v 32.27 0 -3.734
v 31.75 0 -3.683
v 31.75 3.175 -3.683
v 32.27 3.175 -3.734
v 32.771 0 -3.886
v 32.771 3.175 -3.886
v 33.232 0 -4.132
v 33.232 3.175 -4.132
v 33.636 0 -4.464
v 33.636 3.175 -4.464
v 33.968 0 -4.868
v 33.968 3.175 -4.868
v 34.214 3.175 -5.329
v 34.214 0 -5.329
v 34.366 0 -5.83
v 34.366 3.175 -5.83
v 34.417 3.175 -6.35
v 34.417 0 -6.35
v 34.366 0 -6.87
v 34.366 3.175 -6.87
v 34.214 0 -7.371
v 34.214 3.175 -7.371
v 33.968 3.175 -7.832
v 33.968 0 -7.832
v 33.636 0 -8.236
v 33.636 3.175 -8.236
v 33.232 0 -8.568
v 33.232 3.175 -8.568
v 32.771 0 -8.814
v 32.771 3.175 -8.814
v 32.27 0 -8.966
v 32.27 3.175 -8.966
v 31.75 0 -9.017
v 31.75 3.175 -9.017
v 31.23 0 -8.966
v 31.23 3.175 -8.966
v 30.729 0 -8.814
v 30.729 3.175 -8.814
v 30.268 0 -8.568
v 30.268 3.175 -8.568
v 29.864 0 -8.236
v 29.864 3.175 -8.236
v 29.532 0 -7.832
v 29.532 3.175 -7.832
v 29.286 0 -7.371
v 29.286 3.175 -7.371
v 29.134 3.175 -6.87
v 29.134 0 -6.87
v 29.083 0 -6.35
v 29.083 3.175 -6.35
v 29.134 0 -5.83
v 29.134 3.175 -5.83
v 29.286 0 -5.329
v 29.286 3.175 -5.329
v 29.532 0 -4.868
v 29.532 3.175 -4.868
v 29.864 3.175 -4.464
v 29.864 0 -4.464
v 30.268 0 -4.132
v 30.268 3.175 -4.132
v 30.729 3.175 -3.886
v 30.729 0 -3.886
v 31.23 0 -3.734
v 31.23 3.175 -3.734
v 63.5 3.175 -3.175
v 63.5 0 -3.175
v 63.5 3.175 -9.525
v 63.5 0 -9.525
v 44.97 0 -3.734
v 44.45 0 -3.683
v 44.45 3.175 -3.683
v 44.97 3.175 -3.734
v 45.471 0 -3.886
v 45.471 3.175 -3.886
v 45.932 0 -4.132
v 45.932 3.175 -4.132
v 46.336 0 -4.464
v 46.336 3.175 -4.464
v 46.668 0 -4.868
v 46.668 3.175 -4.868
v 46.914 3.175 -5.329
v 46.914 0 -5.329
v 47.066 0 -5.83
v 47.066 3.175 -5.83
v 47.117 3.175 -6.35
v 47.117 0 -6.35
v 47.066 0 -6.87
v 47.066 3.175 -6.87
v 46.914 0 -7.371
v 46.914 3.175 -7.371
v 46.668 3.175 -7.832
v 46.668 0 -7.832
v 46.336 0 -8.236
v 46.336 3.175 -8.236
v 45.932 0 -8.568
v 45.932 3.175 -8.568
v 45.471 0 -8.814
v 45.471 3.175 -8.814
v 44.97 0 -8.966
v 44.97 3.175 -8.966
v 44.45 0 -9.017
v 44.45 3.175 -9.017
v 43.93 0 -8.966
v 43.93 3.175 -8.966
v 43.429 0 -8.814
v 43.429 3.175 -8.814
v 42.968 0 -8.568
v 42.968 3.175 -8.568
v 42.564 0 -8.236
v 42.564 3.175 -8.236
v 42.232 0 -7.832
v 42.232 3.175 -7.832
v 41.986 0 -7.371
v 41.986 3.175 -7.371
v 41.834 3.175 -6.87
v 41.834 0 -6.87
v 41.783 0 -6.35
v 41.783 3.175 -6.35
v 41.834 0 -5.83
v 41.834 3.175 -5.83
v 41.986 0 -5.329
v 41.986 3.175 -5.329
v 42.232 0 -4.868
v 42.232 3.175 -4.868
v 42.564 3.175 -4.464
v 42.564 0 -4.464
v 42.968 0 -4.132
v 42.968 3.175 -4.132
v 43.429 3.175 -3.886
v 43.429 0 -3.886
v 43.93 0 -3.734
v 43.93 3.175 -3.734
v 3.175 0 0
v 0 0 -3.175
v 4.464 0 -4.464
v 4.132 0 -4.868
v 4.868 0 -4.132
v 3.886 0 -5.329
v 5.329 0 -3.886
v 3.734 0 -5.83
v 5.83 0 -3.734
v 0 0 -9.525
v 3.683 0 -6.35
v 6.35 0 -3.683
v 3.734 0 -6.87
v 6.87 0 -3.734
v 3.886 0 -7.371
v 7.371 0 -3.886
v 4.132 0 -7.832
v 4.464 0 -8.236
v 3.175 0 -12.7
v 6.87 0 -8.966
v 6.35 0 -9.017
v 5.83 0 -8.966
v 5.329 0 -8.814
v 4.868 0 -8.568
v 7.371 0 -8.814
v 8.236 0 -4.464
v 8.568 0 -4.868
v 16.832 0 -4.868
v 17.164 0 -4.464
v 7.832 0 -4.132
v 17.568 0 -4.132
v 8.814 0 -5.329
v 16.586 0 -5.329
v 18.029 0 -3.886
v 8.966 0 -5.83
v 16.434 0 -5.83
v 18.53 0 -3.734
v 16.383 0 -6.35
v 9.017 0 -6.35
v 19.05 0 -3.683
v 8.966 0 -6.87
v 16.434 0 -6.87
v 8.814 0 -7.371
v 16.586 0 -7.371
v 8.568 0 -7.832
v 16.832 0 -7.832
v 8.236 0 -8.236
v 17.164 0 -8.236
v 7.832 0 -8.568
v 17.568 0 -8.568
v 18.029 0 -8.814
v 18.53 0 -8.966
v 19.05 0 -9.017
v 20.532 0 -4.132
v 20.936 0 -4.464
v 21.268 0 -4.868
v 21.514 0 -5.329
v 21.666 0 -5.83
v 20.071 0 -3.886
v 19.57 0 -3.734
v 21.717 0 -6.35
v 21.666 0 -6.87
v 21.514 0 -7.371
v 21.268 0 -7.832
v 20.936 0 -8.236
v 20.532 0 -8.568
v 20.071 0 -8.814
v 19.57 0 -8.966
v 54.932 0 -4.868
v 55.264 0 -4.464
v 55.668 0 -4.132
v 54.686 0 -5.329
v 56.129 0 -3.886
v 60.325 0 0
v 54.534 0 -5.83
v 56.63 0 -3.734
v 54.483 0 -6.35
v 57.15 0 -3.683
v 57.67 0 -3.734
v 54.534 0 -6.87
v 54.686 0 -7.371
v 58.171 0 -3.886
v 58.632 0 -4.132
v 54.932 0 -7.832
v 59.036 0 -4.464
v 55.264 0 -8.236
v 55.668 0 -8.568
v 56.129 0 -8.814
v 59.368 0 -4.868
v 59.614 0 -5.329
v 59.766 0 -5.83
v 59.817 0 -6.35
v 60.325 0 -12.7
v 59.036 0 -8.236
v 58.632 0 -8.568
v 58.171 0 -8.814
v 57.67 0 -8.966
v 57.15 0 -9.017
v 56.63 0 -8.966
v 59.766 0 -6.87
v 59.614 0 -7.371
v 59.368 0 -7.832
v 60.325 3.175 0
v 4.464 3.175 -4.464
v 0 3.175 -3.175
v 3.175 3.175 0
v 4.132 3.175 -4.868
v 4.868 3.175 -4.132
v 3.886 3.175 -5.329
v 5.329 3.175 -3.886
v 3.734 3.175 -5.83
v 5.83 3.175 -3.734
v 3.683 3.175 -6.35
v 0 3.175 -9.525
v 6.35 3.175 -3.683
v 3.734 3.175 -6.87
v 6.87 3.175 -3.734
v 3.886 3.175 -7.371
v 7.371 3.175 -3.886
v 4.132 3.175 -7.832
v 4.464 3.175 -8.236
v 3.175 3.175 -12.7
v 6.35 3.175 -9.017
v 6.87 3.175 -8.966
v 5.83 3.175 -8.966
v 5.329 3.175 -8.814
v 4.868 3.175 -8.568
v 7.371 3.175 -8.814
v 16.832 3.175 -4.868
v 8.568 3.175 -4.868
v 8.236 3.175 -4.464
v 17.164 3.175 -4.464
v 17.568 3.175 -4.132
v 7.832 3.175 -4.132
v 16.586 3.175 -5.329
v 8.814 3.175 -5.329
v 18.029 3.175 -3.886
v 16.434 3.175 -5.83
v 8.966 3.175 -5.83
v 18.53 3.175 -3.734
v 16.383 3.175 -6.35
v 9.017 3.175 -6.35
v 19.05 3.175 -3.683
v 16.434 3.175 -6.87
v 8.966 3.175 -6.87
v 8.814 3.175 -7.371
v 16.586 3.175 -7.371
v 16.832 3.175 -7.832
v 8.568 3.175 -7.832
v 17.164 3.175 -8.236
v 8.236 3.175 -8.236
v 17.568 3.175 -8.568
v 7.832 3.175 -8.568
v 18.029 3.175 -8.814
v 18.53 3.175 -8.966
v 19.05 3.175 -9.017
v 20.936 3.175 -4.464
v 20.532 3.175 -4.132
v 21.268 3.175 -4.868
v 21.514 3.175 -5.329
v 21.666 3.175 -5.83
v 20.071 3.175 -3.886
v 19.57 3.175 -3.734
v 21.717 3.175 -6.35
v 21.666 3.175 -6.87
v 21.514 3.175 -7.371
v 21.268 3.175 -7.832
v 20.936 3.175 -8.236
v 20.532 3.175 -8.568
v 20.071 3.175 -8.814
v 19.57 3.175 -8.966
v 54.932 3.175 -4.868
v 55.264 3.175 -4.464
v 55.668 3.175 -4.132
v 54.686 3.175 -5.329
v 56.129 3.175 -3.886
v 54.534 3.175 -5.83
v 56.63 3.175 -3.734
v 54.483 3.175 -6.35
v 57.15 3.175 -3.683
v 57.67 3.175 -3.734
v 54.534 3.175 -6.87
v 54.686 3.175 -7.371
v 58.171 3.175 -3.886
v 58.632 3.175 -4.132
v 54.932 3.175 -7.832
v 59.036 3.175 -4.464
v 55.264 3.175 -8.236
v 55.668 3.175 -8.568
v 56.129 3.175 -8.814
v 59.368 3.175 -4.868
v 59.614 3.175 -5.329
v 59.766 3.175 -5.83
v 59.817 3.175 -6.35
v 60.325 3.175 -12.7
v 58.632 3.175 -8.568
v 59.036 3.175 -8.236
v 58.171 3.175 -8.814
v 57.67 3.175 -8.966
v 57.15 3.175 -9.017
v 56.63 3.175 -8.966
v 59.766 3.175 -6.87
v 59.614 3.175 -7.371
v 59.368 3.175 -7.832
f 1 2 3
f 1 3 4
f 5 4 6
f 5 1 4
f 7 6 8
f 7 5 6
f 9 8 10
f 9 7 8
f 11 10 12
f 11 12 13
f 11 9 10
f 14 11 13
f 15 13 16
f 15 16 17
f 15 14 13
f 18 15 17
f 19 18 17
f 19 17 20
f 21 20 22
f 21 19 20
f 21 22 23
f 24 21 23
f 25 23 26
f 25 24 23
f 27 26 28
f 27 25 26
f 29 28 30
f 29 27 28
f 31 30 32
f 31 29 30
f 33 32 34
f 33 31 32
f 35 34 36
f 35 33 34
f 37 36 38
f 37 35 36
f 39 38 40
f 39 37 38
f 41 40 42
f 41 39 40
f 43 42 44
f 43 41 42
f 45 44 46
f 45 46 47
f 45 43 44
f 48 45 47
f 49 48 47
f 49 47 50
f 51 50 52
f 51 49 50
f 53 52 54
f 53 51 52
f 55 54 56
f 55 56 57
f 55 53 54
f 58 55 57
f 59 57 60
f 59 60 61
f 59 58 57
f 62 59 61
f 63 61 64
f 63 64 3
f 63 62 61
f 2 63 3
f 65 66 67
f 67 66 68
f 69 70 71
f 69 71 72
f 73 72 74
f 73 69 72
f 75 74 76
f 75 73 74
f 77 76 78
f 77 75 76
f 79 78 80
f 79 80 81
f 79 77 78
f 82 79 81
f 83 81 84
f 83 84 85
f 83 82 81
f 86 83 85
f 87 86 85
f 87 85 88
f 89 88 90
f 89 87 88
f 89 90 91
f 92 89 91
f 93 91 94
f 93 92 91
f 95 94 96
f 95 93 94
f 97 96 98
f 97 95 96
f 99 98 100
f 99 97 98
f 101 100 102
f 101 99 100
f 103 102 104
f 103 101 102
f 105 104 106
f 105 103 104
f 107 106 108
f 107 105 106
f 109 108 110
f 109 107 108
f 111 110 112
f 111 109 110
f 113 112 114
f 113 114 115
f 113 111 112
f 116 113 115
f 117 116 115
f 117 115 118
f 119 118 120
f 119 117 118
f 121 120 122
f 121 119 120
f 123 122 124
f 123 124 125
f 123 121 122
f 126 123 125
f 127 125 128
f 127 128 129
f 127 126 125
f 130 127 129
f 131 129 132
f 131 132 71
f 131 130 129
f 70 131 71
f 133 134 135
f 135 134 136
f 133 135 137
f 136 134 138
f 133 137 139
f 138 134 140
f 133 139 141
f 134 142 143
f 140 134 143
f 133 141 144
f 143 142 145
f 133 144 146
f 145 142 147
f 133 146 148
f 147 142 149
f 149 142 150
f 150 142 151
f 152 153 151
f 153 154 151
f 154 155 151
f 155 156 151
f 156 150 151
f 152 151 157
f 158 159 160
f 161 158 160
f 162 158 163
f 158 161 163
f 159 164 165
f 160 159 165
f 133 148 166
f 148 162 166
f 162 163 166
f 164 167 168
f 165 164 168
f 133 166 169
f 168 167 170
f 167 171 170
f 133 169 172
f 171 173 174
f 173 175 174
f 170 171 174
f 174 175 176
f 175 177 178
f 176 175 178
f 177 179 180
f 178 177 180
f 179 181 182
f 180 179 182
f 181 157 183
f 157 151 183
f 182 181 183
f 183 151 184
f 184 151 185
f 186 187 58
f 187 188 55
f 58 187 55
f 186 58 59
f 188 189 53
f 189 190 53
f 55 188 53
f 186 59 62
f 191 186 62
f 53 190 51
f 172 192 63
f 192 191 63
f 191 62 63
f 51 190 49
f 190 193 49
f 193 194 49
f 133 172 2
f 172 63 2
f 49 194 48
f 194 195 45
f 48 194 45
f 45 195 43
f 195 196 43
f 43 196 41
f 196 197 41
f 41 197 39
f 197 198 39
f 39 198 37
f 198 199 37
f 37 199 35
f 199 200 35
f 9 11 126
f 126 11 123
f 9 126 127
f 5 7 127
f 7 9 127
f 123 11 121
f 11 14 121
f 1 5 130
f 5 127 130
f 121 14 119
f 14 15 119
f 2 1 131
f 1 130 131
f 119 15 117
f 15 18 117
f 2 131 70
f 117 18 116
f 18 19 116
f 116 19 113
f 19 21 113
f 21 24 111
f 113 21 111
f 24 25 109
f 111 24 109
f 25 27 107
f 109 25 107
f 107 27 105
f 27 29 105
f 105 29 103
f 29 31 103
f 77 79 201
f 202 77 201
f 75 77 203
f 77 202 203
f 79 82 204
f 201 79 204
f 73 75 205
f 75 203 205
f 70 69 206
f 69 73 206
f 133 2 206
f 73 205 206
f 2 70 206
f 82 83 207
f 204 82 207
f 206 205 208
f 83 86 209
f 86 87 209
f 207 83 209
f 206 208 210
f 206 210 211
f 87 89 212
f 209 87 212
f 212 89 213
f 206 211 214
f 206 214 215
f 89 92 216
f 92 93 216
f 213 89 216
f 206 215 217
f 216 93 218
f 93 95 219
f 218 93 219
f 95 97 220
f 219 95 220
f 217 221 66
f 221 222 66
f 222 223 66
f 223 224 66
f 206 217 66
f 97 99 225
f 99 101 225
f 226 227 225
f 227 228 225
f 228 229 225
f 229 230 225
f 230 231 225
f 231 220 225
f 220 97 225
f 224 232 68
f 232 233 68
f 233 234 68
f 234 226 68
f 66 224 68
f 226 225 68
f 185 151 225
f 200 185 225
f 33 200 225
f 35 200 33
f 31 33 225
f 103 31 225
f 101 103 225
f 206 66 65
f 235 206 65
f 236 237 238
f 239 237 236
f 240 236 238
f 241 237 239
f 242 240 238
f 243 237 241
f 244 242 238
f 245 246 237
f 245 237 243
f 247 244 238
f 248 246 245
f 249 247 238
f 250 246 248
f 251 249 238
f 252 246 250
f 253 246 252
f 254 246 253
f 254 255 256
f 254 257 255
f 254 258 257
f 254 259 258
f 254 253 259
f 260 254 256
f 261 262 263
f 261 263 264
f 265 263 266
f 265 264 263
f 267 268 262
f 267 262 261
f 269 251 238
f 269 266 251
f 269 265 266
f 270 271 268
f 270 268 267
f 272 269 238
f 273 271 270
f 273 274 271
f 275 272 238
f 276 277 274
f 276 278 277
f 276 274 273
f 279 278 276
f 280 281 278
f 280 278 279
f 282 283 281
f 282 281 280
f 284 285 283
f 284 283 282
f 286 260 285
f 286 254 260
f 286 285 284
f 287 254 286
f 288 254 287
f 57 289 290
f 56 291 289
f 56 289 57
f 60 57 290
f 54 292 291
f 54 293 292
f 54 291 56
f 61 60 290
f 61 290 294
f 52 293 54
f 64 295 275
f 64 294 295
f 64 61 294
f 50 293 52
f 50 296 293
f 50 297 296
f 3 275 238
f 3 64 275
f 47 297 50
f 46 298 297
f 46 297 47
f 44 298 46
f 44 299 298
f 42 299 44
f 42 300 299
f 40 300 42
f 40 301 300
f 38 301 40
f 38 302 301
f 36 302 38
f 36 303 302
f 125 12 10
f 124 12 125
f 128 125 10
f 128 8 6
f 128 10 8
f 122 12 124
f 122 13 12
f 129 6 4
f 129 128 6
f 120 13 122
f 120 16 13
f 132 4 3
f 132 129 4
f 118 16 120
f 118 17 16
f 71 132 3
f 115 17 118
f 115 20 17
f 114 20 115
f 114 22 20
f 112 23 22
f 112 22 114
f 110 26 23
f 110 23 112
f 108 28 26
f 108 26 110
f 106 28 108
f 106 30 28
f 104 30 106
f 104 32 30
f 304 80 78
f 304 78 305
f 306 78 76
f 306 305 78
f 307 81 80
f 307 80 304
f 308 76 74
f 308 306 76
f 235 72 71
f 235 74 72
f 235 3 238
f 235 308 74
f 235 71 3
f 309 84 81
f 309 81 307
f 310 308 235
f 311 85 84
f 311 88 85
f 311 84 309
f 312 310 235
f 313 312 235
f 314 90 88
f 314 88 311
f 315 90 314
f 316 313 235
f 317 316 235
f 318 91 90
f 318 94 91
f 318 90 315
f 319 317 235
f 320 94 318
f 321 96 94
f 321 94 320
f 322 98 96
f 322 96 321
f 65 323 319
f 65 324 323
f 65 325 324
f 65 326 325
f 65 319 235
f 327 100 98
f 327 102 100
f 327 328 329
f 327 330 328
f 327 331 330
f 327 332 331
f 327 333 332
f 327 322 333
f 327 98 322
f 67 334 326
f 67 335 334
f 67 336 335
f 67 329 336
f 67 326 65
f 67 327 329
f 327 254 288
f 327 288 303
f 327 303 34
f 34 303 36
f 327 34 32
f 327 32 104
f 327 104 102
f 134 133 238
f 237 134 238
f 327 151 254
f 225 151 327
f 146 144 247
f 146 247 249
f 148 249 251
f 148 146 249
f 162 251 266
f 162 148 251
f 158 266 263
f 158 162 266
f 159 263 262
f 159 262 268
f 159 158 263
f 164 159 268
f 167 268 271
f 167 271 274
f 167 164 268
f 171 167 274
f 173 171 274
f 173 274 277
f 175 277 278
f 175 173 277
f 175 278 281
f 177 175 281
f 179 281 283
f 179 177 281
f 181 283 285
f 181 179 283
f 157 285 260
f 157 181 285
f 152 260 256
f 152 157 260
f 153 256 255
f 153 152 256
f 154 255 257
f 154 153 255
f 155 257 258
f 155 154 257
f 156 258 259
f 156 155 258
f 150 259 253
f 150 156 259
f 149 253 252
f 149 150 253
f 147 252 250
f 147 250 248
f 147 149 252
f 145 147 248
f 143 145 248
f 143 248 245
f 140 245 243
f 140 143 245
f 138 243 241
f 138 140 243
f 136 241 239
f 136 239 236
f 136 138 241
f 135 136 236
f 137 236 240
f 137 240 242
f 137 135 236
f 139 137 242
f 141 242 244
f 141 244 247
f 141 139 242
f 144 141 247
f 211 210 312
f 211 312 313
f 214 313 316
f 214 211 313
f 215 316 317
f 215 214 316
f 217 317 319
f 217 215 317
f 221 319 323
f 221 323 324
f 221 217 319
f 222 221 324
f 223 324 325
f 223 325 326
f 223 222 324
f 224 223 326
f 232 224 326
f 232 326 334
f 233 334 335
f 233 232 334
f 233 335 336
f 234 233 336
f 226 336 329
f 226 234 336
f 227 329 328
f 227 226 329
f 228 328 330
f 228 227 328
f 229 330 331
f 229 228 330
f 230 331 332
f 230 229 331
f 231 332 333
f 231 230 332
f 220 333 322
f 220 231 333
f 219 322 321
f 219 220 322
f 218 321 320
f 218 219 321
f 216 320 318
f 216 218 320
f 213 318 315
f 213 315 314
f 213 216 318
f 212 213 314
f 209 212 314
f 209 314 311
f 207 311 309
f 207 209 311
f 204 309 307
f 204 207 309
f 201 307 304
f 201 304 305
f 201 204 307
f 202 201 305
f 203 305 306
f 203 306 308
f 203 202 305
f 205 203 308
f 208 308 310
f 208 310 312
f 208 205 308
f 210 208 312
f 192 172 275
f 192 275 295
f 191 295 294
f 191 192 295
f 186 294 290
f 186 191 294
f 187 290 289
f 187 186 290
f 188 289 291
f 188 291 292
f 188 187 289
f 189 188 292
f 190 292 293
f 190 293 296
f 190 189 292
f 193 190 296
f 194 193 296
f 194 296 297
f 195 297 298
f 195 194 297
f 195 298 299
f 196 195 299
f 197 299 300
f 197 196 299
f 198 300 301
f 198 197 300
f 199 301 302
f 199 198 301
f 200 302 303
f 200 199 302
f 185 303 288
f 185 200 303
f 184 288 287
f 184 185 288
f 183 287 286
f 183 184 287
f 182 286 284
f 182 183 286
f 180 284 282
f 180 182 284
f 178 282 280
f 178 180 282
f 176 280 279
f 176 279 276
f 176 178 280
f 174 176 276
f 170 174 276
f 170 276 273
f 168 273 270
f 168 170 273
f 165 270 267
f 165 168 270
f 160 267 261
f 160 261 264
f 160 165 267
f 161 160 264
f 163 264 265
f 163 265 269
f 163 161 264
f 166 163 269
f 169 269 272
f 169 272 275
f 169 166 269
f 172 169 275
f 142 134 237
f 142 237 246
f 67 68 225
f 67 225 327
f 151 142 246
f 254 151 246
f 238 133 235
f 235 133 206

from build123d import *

# Parameters (mm, degrees)
SKETCH1_W           = 63.5
SKETCH1_H           = 12.7
SKETCH1_R           = 2.667
BOSS_EXTRUDE1_DEPTH = 3.175
CHAMFER1_SIZE       = 3.175


with BuildPart() as part:
    # Sketch1 → Boss-Extrude1 (new body)
    with BuildSketch(Plane(origin=(0, 0, 0), x_dir=(1, 0, 0), z_dir=(0, 1, 0))):
        with Locations((31.75, 6.35)):
            Rectangle(SKETCH1_W, SKETCH1_H)
        with Locations(Location((19.05, 6.35, 0), (0, 0, 270))):
            Circle(SKETCH1_R, mode=Mode.SUBTRACT)
        with Locations(Location((6.35, 6.35, 0), (0, 0, 270))):
            Circle(SKETCH1_R, mode=Mode.SUBTRACT)
        with Locations(Location((57.15, 6.35, 0), (0, 0, 270))):
            Circle(SKETCH1_R, mode=Mode.SUBTRACT)
        with Locations(Location((44.45, 6.35, 0), (0, 0, 270))):
            Circle(SKETCH1_R, mode=Mode.SUBTRACT)
        with Locations(Location((31.75, 6.35, 0), (0, 0, 270))):
            Circle(SKETCH1_R, mode=Mode.SUBTRACT)
    extrude(amount=BOSS_EXTRUDE1_DEPTH)

    # Chamfer1
    chamfer1_edges = [part.edges().sort_by_distance(p)[0] for p in [
        (0, 1.5875, 0),
        (0, 1.5875, -12.7),
        (63.5, 1.5875, -12.7),
        (63.5, 1.5875, 0),
    ]]
    chamfer(chamfer1_edges, length=CHAMFER1_SIZE)


solid = part.part
